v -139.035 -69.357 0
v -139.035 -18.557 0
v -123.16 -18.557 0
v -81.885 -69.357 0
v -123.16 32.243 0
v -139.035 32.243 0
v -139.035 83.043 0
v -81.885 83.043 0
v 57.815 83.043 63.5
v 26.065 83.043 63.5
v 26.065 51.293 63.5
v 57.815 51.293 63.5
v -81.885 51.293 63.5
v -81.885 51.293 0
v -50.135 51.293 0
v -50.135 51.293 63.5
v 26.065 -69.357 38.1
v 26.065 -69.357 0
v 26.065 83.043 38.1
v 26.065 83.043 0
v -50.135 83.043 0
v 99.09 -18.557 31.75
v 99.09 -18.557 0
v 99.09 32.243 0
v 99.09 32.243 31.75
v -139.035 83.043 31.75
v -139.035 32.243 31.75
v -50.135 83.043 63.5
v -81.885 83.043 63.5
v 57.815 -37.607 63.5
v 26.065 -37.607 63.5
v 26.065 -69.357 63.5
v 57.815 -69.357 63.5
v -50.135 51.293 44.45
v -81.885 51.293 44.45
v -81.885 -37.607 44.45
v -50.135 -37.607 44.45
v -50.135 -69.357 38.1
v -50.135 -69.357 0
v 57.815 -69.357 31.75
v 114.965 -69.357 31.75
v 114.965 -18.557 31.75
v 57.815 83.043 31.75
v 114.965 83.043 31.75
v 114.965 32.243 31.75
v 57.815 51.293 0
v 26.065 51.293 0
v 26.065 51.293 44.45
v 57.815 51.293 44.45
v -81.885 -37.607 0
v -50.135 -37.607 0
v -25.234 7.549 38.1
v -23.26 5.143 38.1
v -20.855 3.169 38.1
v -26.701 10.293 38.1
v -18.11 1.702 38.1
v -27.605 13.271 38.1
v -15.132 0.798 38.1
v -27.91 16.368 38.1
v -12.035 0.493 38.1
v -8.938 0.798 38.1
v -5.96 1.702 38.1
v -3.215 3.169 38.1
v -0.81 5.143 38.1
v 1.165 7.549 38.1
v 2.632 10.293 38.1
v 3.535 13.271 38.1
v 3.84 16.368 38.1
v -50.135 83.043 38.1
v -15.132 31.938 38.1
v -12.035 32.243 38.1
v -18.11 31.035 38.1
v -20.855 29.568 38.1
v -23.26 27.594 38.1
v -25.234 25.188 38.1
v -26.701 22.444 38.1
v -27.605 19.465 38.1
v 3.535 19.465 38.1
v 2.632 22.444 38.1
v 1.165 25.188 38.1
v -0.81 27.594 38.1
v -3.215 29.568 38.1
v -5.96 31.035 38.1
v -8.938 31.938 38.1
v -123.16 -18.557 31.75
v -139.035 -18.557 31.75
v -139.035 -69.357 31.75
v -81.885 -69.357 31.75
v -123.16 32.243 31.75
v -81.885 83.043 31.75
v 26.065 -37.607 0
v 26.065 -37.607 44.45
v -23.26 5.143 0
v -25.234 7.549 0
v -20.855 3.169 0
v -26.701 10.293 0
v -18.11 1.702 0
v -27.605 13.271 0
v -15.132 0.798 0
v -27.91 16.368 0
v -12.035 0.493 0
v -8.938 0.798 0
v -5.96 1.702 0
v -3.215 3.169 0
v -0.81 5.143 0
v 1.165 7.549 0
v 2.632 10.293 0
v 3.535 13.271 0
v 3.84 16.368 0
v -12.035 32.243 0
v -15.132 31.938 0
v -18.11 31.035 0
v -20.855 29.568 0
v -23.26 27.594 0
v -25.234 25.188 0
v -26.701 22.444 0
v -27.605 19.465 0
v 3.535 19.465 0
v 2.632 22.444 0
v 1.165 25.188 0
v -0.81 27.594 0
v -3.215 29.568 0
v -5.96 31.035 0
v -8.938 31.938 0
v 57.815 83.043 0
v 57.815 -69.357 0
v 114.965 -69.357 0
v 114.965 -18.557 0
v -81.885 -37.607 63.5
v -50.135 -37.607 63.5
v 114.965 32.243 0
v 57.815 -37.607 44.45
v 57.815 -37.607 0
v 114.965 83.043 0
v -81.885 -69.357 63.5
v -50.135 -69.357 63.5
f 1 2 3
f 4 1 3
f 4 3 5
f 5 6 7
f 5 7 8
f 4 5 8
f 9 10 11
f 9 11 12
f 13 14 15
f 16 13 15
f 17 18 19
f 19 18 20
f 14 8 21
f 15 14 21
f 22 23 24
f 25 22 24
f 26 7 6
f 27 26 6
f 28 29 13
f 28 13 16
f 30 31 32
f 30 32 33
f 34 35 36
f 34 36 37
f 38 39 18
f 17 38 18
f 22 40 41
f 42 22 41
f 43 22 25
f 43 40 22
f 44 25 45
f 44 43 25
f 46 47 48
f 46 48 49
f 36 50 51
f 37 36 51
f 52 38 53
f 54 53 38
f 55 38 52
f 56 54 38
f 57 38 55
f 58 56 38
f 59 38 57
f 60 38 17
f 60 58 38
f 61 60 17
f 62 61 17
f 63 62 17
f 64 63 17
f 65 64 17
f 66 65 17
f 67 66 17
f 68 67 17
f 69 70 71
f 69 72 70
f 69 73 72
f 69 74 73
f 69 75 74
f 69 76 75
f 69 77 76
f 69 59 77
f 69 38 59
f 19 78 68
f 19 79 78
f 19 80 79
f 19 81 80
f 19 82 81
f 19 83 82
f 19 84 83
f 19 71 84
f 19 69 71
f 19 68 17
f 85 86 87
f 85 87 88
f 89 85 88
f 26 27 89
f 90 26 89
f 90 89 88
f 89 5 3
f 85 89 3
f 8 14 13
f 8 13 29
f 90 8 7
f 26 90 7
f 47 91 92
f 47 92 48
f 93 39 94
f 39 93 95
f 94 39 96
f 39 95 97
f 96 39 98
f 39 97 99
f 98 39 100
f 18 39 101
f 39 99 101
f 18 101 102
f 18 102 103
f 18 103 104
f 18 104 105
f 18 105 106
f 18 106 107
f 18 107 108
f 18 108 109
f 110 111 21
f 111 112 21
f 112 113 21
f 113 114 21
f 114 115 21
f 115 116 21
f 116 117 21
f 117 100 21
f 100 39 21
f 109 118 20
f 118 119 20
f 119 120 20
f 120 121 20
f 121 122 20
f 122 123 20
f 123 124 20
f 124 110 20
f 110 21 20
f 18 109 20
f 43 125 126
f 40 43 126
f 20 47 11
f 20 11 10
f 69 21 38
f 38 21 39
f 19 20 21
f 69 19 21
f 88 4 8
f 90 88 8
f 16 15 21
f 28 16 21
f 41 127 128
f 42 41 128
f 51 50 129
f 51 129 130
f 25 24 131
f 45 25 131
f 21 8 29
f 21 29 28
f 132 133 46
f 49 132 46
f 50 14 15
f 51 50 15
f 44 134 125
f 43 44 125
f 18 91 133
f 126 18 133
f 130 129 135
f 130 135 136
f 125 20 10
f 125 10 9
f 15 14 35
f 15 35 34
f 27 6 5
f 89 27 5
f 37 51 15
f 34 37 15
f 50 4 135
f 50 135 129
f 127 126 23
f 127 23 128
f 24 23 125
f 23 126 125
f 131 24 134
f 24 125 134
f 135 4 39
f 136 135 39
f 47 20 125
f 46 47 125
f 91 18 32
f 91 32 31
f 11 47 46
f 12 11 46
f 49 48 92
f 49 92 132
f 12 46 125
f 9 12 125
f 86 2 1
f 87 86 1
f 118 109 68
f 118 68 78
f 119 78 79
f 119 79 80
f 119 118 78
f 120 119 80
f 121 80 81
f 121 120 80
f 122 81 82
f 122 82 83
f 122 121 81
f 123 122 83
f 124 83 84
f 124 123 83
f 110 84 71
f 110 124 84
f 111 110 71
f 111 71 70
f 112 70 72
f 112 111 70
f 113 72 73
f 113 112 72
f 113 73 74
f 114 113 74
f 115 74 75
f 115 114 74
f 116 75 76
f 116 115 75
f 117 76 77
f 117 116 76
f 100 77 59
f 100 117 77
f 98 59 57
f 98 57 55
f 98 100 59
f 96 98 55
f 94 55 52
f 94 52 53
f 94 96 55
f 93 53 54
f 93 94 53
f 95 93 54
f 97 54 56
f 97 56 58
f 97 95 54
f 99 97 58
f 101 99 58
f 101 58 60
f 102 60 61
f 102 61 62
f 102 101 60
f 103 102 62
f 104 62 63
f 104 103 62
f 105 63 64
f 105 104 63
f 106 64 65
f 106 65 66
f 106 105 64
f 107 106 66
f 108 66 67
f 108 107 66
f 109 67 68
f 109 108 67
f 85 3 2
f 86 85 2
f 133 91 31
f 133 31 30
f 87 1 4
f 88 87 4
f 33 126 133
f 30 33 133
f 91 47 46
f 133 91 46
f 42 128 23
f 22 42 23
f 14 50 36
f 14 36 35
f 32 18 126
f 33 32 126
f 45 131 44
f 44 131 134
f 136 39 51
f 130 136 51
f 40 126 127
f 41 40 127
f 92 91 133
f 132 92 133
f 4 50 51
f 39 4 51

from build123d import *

# Parameters (mm, degrees)
F1_DEPTH = 31.75
F0_R     = 15.875
F2_DEPTH = 38.1
F0_W     = 31.75
F0_H     = 88.9
F3_DEPTH = 44.45
F0_H_2   = 31.75
F4_DEPTH = 63.5


with BuildPart() as f1:
    # F0 (on Top) → F1 (new body)
    with BuildSketch(Plane.XY):
        Polygon((-81.88489, 83.043418), (-139.03489, 83.043418), (-139.03489, 32.243418), (-123.15989, 32.243418), (-123.15989, -18.556582), (-139.03489, -18.556582), (-139.03489, -69.356582), (-81.88489, -69.356582), (-81.88489, -37.606582), (-81.88489, 51.293418), align=None)
        Polygon((114.96511, 83.043418), (57.81511, 83.043418), (57.81511, 51.293418), (57.81511, -37.606582), (57.81511, -69.356582), (114.96511, -69.356582), (114.96511, -18.556582), (99.09011, -18.556582), (99.09011, 32.243418), (114.96511, 32.243418), align=None)
    extrude(amount=F1_DEPTH)


with BuildPart() as f2:
    # F0 (on Top) → F2 (new body)
    with BuildSketch(Plane.XY):
        Polygon((26.06511, 83.043418), (-50.13489, 83.043418), (-50.13489, 51.293418), (-50.13489, -37.606582), (-50.13489, -69.356582), (26.06511, -69.356582), (26.06511, -37.606582), (26.06511, 51.293418), align=None)
        with Locations((-12.03489, 16.368418)):
            Circle(F0_R, mode=Mode.SUBTRACT)
    extrude(amount=F2_DEPTH)


with BuildPart() as f3:
    # F0 (on Top) → F3 (new body)
    with BuildSketch(Plane.XY):
        with Locations((-66.00989, 6.843418)):
            Rectangle(F0_W, F0_H)
        with Locations((41.94011, 6.843418)):
            Rectangle(F0_W, F0_H)
    extrude(amount=F3_DEPTH)


with BuildPart() as f4:
    # F0 (on Top) → F4 (new body)
    with BuildSketch(Plane.XY):
        with Locations((-66.00989, 67.168418)):
            Rectangle(F0_W, F0_H_2)
        with Locations((-66.00989, -53.481582)):
            Rectangle(F0_W, F0_H_2)
        with Locations((41.94011, 67.168418)):
            Rectangle(F0_W, F0_H_2)
        with Locations((41.94011, -53.481582)):
            Rectangle(F0_W, F0_H_2)
    extrude(amount=F4_DEPTH)


solid = Compound([f1.part, f2.part, f3.part, f4.part])
